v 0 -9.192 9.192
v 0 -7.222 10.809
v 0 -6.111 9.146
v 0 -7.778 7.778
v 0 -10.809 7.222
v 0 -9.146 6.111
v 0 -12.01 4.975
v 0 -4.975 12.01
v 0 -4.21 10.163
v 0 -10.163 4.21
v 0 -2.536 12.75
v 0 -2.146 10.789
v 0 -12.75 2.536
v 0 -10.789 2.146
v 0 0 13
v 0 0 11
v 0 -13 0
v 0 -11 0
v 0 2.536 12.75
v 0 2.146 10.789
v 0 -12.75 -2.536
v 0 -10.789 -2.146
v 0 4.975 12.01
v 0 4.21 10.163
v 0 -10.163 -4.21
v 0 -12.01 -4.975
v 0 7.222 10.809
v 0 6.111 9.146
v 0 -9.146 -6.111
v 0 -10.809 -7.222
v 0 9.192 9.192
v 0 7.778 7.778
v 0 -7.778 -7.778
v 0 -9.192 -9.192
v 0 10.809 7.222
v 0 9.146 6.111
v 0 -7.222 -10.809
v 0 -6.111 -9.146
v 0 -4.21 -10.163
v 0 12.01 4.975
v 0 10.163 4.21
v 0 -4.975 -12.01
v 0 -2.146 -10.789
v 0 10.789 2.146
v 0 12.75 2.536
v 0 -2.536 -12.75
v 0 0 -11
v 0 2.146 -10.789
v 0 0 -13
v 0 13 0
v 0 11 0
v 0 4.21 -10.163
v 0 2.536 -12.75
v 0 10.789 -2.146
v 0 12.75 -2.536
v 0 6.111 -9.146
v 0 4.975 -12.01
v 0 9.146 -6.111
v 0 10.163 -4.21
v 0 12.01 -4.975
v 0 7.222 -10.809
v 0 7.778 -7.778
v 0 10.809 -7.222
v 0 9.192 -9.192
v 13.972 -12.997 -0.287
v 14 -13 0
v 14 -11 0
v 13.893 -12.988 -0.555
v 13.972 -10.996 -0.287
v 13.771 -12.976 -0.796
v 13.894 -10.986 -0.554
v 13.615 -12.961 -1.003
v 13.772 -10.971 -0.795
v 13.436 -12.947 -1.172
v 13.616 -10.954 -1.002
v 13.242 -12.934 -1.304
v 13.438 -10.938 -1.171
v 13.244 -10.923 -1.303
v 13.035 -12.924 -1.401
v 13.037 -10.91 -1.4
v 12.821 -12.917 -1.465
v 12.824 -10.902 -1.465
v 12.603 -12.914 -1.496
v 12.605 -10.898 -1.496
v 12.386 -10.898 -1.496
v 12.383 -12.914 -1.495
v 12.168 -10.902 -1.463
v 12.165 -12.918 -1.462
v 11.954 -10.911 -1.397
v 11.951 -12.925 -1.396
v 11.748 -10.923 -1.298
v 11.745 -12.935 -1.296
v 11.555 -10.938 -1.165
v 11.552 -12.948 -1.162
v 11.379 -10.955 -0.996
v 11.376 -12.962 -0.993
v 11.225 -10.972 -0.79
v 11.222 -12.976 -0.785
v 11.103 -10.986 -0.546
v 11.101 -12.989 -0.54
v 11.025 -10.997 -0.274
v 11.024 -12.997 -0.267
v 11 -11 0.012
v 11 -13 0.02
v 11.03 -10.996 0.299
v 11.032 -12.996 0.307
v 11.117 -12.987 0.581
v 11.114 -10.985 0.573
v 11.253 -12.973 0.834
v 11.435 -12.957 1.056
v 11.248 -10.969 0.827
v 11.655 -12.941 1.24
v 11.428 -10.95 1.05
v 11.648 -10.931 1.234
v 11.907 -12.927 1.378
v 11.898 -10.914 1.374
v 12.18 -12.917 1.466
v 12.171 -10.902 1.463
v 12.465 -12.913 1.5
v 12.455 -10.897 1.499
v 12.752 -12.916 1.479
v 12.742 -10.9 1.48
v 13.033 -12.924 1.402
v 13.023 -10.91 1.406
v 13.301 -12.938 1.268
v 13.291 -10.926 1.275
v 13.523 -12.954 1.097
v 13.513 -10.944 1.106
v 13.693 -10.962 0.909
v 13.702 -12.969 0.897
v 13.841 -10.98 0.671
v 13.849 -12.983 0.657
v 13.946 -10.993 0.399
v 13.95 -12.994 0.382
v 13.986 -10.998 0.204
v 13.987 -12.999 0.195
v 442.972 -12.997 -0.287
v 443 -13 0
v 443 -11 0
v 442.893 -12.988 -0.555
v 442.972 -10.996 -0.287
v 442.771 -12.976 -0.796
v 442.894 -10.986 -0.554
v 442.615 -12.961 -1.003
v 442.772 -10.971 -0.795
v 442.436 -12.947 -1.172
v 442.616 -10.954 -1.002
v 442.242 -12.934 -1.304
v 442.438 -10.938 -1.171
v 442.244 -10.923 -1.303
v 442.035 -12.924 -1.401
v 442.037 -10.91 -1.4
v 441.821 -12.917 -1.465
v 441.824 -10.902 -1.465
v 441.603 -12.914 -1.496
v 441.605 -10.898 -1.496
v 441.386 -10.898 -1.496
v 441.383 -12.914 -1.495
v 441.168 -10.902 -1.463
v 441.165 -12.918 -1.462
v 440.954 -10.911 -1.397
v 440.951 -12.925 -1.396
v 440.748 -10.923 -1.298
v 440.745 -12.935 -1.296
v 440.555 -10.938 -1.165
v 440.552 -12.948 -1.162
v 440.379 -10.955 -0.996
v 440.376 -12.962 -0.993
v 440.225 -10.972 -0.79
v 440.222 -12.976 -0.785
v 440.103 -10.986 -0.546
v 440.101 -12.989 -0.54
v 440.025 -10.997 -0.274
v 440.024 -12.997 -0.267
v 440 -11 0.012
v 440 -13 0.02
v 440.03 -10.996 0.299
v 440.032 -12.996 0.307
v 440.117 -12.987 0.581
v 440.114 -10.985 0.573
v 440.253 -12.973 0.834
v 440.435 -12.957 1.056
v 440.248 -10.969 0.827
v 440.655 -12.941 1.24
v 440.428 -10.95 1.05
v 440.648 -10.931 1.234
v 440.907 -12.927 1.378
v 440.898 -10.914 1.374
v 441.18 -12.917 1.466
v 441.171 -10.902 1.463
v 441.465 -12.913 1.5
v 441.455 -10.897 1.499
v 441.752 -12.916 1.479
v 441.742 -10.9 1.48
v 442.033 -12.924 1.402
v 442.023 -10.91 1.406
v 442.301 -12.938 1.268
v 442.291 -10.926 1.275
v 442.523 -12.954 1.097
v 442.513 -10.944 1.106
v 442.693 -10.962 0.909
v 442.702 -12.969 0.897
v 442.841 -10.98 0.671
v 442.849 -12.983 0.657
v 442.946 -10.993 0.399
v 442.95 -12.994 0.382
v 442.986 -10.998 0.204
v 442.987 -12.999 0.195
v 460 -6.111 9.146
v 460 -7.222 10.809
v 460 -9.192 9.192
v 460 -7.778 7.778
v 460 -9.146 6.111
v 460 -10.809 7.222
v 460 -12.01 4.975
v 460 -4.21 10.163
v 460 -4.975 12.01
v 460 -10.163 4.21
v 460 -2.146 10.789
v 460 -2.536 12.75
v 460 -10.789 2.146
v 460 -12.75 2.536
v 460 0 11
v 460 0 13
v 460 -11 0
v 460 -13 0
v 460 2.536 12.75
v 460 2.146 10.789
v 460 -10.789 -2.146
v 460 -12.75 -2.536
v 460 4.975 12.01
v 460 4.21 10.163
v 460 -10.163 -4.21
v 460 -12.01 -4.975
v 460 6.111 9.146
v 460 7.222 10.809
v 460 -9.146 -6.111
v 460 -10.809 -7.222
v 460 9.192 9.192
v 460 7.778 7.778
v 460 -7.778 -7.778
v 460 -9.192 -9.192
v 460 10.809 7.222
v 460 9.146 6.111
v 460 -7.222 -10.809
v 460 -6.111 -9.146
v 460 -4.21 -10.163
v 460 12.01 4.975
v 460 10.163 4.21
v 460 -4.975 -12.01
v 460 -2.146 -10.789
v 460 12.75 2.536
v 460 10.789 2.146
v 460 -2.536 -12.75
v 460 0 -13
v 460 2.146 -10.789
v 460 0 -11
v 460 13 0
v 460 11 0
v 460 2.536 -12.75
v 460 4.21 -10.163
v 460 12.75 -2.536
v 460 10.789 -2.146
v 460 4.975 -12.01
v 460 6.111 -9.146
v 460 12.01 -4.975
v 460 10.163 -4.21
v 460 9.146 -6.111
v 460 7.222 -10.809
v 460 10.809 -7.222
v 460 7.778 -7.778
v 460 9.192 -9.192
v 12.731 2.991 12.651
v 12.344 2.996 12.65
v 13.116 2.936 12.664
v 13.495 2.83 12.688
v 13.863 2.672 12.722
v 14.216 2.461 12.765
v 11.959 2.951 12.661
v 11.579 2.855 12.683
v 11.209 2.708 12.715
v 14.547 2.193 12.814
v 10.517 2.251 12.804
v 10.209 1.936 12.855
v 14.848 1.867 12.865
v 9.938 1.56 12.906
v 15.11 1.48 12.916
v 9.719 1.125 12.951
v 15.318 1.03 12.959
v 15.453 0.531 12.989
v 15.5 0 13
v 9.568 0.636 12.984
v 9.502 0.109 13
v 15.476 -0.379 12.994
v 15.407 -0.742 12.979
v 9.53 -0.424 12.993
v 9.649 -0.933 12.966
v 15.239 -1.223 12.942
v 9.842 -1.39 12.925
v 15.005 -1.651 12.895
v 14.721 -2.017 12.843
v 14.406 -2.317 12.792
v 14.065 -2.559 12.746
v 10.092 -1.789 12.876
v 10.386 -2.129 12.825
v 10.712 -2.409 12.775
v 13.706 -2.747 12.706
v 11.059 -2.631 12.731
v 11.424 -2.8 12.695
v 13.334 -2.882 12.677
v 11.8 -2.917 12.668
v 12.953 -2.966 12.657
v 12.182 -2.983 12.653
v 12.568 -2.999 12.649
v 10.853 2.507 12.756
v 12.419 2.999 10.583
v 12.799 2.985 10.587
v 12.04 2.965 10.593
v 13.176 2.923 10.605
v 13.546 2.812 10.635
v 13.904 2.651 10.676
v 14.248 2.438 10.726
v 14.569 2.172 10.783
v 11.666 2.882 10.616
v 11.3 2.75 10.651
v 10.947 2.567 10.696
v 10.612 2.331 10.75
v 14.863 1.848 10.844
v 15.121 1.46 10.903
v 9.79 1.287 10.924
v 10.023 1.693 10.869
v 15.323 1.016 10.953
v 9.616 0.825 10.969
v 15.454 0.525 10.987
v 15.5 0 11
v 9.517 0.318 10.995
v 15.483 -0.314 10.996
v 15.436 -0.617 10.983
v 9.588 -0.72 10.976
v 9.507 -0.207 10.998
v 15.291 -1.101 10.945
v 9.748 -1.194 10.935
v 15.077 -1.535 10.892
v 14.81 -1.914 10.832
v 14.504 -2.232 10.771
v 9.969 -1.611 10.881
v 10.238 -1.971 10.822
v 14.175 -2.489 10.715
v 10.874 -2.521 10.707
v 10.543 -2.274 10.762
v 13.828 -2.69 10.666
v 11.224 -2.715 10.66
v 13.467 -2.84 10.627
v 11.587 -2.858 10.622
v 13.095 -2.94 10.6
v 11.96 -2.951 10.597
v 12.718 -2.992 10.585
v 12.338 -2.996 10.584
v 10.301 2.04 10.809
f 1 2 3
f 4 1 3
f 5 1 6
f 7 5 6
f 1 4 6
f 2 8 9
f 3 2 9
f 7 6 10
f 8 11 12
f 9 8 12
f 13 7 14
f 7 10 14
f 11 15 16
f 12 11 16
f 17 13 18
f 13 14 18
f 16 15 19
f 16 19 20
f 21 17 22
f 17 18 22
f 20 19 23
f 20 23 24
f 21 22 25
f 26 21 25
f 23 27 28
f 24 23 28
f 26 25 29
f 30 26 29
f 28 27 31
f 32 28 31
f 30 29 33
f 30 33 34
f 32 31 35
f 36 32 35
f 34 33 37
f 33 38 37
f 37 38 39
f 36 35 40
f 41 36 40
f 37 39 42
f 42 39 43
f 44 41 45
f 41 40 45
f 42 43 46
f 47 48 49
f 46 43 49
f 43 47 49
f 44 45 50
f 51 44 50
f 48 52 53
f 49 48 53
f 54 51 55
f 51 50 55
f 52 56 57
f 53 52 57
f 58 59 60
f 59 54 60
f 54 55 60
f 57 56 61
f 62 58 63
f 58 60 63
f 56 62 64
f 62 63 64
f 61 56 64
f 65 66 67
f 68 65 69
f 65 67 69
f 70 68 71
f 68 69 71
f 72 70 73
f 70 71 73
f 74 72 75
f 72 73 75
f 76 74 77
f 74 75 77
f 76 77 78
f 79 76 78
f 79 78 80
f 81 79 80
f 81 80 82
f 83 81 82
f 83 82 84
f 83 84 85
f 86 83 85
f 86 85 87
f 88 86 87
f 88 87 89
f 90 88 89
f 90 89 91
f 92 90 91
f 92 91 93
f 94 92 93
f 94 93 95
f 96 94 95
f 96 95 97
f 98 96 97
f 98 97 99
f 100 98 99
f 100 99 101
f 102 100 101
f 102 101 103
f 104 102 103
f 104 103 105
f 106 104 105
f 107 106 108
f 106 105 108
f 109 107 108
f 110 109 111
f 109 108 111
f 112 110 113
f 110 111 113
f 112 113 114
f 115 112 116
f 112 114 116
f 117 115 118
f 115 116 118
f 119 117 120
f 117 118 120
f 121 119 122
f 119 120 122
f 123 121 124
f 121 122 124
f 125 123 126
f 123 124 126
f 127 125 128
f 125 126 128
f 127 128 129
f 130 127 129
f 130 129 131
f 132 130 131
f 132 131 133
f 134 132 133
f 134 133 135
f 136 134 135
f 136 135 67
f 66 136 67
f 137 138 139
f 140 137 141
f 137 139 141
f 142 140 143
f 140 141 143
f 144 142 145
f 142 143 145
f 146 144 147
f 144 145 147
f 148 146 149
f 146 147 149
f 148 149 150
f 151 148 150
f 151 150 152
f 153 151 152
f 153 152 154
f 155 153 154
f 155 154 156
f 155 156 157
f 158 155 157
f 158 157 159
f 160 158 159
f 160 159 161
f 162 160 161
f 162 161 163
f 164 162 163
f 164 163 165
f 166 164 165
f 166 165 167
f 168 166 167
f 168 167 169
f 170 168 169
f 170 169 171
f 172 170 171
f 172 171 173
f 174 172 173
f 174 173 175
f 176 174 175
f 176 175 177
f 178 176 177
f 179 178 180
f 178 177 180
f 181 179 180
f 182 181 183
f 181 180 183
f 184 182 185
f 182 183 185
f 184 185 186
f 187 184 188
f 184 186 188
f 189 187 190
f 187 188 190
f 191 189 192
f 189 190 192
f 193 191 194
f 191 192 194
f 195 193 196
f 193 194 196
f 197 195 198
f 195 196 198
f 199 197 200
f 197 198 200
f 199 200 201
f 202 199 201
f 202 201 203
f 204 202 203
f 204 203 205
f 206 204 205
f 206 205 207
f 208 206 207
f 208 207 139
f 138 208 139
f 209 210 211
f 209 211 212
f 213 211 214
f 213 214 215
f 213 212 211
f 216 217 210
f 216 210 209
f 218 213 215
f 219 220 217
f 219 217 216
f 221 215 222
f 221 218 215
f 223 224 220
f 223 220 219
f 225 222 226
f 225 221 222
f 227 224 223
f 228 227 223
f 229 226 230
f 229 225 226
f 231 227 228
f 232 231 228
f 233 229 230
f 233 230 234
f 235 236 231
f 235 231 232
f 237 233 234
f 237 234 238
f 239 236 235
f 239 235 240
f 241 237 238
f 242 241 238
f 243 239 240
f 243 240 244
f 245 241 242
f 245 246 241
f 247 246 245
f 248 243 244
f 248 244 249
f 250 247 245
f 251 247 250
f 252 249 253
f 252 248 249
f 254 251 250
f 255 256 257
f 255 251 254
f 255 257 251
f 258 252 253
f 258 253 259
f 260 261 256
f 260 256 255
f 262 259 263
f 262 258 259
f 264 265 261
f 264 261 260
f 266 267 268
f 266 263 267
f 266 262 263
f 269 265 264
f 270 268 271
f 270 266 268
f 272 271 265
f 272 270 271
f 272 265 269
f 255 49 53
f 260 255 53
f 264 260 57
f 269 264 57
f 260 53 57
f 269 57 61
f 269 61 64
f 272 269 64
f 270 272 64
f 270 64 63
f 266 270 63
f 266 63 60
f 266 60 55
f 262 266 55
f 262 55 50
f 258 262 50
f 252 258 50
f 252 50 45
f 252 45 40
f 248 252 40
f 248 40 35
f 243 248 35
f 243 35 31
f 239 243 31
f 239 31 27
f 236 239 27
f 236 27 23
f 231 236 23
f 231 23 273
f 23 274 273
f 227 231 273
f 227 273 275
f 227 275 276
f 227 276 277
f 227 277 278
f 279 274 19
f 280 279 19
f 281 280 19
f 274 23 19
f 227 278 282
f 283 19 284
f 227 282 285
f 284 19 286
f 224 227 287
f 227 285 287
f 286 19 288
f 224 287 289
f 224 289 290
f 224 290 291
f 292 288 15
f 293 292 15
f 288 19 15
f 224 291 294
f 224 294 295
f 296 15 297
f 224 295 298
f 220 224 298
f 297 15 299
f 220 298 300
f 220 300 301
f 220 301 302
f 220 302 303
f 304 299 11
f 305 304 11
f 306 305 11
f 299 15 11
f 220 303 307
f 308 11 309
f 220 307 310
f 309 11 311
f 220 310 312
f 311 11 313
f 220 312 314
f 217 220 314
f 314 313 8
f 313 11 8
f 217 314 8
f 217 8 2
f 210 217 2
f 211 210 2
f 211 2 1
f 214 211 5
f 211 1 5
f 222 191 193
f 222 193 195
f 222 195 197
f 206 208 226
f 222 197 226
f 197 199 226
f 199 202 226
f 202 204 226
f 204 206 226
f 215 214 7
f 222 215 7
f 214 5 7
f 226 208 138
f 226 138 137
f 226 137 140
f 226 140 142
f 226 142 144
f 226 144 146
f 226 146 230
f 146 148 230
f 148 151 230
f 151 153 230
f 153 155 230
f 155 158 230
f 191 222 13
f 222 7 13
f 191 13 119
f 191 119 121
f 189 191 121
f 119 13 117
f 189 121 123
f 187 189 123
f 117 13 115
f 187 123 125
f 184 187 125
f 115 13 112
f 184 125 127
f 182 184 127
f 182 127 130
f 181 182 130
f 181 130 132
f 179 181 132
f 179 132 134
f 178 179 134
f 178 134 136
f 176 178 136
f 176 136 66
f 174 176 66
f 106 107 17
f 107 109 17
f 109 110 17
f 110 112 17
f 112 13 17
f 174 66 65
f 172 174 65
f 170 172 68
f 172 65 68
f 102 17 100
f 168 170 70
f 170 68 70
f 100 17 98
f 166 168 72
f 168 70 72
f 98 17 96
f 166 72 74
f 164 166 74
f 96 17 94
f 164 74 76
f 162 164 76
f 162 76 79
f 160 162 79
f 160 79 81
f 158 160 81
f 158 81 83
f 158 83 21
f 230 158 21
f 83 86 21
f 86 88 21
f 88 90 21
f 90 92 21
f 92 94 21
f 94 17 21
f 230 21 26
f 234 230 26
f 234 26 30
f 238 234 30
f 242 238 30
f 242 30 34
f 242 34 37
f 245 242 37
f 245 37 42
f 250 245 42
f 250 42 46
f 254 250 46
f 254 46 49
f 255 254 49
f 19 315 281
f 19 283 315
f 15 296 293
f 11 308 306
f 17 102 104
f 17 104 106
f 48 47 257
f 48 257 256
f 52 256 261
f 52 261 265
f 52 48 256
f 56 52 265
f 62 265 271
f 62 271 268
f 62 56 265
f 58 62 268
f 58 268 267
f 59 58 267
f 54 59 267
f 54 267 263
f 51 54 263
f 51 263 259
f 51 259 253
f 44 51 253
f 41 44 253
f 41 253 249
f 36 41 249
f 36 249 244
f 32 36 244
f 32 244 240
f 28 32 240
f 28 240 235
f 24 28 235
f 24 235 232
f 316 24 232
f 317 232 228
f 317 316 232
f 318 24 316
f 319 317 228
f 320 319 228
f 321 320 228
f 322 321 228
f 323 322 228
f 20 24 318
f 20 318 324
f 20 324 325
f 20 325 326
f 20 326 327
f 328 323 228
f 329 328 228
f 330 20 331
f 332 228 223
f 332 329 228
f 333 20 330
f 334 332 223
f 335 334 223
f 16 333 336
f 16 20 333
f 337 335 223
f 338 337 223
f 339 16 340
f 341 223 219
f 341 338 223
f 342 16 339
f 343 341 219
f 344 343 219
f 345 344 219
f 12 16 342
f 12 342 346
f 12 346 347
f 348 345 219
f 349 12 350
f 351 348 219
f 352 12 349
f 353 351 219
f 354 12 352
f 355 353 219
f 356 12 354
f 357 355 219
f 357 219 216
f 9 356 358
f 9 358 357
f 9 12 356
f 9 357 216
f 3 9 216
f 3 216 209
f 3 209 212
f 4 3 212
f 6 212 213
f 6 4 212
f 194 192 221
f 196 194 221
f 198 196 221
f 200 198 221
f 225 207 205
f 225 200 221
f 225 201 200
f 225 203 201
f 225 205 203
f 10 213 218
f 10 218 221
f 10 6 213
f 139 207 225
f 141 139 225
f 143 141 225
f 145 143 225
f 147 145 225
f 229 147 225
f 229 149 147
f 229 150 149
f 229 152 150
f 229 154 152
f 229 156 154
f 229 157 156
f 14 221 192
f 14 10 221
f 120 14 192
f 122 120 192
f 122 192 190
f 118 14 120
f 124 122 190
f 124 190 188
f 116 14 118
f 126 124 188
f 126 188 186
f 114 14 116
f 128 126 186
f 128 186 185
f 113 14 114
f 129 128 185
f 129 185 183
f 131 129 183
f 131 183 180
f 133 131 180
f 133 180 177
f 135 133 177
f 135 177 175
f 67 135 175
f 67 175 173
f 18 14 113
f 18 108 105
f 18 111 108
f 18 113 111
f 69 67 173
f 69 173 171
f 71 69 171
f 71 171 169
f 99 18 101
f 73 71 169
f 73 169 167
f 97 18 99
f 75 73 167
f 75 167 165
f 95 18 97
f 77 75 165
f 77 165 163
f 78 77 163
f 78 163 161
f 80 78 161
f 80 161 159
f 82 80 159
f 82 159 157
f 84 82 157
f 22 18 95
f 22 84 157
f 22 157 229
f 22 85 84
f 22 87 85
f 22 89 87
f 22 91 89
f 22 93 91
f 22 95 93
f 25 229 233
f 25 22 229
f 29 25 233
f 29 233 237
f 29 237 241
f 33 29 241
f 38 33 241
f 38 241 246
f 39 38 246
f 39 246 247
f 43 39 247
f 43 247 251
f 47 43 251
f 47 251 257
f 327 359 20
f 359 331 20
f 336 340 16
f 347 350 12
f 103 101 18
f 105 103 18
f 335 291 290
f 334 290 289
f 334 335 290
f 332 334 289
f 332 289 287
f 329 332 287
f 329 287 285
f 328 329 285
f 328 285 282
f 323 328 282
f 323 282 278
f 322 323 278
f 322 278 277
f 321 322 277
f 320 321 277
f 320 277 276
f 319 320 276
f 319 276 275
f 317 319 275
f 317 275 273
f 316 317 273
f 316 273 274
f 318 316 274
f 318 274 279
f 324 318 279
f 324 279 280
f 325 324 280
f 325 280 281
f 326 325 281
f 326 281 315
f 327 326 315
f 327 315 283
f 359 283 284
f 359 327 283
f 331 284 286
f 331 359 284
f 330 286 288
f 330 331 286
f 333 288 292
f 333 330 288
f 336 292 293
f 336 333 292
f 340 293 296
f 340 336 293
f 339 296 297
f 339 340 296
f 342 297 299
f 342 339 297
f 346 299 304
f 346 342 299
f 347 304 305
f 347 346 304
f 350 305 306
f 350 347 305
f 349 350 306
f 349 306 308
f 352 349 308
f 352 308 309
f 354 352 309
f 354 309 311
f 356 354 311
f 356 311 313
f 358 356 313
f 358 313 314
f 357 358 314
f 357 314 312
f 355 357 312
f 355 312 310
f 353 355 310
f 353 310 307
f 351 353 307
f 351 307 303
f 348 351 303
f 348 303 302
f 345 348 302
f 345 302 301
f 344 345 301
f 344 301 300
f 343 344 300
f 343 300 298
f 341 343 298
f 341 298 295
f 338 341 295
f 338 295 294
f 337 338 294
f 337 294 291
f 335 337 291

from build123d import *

# Parameters (mm, degrees)
SKETCH_1_R          = 13
SKETCH_1_R_2        = 11
EXTRUDE_1_DEPTH     = 460
SKETCH_4_R          = 1.5
CUT_EXTRUDE_2_DEPTH = 14
SKETCH_6_R          = 3
CUT_EXTRUDE_3_DEPTH = 14.0000001


with BuildPart() as part:
    # 草图1 → 凸台-拉伸1 (new body)
    with BuildSketch(Plane(origin=(0, 0, 0), x_dir=(0, 0, -1), z_dir=(1, 0, 0))):
        Circle(SKETCH_1_R)
        Circle(SKETCH_1_R_2, mode=Mode.SUBTRACT)
    extrude(amount=EXTRUDE_1_DEPTH)

    # 草图4 → 切除-拉伸2 (cut, through all)
    with BuildSketch(Plane(origin=(0, 0, 0), x_dir=(1, 0, 0), z_dir=(0, 1, 0))):
        with Locations((12.5, 0)):
            Circle(SKETCH_4_R)
        with Locations((441.5, 0)):
            Circle(SKETCH_4_R)
    extrude(amount=-CUT_EXTRUDE_2_DEPTH, mode=Mode.SUBTRACT)

    # 草图6 → 切除-拉伸3 (cut, through all)
    with BuildSketch(Plane.XY):
        with Locations((12.5, 0)):
            Circle(SKETCH_6_R)
    extrude(amount=CUT_EXTRUDE_3_DEPTH, mode=Mode.SUBTRACT)


solid = part.part
